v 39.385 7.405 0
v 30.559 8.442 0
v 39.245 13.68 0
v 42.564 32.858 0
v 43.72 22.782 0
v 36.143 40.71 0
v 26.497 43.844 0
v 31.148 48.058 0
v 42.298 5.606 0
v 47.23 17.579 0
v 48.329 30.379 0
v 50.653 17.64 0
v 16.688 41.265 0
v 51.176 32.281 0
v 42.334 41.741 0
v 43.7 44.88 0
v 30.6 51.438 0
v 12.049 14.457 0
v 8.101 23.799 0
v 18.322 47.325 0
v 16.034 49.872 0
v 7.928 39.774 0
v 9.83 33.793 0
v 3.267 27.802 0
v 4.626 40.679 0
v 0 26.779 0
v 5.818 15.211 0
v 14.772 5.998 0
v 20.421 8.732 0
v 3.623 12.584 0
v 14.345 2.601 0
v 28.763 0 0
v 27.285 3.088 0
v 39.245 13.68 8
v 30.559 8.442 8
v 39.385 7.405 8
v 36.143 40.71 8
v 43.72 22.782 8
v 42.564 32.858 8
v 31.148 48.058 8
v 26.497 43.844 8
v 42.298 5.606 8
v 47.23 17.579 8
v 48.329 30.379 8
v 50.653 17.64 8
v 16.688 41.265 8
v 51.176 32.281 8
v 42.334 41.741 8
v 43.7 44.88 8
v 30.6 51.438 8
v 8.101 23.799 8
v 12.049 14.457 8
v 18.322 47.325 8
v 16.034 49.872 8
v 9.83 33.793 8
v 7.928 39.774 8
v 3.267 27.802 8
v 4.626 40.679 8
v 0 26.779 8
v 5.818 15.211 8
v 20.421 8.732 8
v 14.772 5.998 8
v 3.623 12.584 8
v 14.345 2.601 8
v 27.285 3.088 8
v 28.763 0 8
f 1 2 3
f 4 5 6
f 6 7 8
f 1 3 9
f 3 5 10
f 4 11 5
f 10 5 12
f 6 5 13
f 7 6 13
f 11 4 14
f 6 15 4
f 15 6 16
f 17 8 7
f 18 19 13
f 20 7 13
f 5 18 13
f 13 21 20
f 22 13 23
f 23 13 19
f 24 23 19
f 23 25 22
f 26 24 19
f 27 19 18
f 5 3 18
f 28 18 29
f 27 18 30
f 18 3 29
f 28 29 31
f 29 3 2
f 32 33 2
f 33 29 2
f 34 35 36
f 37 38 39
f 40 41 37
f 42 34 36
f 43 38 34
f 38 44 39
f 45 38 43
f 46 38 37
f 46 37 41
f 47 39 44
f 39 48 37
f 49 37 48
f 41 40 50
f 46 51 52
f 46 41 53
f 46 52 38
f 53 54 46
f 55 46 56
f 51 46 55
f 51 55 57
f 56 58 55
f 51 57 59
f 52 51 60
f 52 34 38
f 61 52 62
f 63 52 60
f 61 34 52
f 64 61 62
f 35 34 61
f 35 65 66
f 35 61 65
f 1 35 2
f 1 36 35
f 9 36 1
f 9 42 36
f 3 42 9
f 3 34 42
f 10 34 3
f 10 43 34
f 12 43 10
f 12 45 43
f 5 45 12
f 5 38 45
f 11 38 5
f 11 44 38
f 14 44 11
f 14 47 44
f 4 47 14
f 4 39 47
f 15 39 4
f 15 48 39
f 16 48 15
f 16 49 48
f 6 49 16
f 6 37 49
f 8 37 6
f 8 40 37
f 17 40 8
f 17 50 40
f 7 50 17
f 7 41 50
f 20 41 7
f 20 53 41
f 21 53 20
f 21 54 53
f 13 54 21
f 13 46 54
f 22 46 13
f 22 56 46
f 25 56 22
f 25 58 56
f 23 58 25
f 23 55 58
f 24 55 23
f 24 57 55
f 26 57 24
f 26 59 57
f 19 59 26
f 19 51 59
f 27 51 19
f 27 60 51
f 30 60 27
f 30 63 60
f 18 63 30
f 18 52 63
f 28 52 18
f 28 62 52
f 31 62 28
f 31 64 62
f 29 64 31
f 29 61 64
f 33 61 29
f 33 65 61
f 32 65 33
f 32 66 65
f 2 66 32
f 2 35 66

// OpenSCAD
$fn = 32;

// ----------------------------------------------------------------------
// Fan rotor section: 11 blades, 18 mm hub radius, 8 mm blades
// ----------------------------------------------------------------------

// --- parameters (mm) ---
profile_height = 8;       // extrusion height
profile_points = 33;      // points of the closed outline

profile = [[43.72, 22.782], [48.329, 30.379], [51.176, 32.281], [42.564, 32.858], [42.334, 41.741], [43.7, 44.88], [36.143, 40.71], [31.148, 48.058], [30.6, 51.438], [26.497, 43.844], [18.322, 47.325], [16.034, 49.872], [16.688, 41.265], [7.928, 39.774], [4.626, 40.679], [9.83, 33.793], [3.267, 27.802], [0, 26.779], [8.101, 23.799], [5.818, 15.211], [3.623, 12.584], [12.049, 14.457], [14.772, 5.998], [14.345, 2.601], [20.421, 8.732], [27.285, 3.088], [28.763, 0], [30.559, 8.442], [39.385, 7.405], [42.298, 5.606], [39.245, 13.68], [47.23, 17.579], [50.653, 17.64]];  // single closed polygon, 33 points, counter clockwise

// --- the one profile operation ---
linear_extrude(height = profile_height) polygon(points = profile);
